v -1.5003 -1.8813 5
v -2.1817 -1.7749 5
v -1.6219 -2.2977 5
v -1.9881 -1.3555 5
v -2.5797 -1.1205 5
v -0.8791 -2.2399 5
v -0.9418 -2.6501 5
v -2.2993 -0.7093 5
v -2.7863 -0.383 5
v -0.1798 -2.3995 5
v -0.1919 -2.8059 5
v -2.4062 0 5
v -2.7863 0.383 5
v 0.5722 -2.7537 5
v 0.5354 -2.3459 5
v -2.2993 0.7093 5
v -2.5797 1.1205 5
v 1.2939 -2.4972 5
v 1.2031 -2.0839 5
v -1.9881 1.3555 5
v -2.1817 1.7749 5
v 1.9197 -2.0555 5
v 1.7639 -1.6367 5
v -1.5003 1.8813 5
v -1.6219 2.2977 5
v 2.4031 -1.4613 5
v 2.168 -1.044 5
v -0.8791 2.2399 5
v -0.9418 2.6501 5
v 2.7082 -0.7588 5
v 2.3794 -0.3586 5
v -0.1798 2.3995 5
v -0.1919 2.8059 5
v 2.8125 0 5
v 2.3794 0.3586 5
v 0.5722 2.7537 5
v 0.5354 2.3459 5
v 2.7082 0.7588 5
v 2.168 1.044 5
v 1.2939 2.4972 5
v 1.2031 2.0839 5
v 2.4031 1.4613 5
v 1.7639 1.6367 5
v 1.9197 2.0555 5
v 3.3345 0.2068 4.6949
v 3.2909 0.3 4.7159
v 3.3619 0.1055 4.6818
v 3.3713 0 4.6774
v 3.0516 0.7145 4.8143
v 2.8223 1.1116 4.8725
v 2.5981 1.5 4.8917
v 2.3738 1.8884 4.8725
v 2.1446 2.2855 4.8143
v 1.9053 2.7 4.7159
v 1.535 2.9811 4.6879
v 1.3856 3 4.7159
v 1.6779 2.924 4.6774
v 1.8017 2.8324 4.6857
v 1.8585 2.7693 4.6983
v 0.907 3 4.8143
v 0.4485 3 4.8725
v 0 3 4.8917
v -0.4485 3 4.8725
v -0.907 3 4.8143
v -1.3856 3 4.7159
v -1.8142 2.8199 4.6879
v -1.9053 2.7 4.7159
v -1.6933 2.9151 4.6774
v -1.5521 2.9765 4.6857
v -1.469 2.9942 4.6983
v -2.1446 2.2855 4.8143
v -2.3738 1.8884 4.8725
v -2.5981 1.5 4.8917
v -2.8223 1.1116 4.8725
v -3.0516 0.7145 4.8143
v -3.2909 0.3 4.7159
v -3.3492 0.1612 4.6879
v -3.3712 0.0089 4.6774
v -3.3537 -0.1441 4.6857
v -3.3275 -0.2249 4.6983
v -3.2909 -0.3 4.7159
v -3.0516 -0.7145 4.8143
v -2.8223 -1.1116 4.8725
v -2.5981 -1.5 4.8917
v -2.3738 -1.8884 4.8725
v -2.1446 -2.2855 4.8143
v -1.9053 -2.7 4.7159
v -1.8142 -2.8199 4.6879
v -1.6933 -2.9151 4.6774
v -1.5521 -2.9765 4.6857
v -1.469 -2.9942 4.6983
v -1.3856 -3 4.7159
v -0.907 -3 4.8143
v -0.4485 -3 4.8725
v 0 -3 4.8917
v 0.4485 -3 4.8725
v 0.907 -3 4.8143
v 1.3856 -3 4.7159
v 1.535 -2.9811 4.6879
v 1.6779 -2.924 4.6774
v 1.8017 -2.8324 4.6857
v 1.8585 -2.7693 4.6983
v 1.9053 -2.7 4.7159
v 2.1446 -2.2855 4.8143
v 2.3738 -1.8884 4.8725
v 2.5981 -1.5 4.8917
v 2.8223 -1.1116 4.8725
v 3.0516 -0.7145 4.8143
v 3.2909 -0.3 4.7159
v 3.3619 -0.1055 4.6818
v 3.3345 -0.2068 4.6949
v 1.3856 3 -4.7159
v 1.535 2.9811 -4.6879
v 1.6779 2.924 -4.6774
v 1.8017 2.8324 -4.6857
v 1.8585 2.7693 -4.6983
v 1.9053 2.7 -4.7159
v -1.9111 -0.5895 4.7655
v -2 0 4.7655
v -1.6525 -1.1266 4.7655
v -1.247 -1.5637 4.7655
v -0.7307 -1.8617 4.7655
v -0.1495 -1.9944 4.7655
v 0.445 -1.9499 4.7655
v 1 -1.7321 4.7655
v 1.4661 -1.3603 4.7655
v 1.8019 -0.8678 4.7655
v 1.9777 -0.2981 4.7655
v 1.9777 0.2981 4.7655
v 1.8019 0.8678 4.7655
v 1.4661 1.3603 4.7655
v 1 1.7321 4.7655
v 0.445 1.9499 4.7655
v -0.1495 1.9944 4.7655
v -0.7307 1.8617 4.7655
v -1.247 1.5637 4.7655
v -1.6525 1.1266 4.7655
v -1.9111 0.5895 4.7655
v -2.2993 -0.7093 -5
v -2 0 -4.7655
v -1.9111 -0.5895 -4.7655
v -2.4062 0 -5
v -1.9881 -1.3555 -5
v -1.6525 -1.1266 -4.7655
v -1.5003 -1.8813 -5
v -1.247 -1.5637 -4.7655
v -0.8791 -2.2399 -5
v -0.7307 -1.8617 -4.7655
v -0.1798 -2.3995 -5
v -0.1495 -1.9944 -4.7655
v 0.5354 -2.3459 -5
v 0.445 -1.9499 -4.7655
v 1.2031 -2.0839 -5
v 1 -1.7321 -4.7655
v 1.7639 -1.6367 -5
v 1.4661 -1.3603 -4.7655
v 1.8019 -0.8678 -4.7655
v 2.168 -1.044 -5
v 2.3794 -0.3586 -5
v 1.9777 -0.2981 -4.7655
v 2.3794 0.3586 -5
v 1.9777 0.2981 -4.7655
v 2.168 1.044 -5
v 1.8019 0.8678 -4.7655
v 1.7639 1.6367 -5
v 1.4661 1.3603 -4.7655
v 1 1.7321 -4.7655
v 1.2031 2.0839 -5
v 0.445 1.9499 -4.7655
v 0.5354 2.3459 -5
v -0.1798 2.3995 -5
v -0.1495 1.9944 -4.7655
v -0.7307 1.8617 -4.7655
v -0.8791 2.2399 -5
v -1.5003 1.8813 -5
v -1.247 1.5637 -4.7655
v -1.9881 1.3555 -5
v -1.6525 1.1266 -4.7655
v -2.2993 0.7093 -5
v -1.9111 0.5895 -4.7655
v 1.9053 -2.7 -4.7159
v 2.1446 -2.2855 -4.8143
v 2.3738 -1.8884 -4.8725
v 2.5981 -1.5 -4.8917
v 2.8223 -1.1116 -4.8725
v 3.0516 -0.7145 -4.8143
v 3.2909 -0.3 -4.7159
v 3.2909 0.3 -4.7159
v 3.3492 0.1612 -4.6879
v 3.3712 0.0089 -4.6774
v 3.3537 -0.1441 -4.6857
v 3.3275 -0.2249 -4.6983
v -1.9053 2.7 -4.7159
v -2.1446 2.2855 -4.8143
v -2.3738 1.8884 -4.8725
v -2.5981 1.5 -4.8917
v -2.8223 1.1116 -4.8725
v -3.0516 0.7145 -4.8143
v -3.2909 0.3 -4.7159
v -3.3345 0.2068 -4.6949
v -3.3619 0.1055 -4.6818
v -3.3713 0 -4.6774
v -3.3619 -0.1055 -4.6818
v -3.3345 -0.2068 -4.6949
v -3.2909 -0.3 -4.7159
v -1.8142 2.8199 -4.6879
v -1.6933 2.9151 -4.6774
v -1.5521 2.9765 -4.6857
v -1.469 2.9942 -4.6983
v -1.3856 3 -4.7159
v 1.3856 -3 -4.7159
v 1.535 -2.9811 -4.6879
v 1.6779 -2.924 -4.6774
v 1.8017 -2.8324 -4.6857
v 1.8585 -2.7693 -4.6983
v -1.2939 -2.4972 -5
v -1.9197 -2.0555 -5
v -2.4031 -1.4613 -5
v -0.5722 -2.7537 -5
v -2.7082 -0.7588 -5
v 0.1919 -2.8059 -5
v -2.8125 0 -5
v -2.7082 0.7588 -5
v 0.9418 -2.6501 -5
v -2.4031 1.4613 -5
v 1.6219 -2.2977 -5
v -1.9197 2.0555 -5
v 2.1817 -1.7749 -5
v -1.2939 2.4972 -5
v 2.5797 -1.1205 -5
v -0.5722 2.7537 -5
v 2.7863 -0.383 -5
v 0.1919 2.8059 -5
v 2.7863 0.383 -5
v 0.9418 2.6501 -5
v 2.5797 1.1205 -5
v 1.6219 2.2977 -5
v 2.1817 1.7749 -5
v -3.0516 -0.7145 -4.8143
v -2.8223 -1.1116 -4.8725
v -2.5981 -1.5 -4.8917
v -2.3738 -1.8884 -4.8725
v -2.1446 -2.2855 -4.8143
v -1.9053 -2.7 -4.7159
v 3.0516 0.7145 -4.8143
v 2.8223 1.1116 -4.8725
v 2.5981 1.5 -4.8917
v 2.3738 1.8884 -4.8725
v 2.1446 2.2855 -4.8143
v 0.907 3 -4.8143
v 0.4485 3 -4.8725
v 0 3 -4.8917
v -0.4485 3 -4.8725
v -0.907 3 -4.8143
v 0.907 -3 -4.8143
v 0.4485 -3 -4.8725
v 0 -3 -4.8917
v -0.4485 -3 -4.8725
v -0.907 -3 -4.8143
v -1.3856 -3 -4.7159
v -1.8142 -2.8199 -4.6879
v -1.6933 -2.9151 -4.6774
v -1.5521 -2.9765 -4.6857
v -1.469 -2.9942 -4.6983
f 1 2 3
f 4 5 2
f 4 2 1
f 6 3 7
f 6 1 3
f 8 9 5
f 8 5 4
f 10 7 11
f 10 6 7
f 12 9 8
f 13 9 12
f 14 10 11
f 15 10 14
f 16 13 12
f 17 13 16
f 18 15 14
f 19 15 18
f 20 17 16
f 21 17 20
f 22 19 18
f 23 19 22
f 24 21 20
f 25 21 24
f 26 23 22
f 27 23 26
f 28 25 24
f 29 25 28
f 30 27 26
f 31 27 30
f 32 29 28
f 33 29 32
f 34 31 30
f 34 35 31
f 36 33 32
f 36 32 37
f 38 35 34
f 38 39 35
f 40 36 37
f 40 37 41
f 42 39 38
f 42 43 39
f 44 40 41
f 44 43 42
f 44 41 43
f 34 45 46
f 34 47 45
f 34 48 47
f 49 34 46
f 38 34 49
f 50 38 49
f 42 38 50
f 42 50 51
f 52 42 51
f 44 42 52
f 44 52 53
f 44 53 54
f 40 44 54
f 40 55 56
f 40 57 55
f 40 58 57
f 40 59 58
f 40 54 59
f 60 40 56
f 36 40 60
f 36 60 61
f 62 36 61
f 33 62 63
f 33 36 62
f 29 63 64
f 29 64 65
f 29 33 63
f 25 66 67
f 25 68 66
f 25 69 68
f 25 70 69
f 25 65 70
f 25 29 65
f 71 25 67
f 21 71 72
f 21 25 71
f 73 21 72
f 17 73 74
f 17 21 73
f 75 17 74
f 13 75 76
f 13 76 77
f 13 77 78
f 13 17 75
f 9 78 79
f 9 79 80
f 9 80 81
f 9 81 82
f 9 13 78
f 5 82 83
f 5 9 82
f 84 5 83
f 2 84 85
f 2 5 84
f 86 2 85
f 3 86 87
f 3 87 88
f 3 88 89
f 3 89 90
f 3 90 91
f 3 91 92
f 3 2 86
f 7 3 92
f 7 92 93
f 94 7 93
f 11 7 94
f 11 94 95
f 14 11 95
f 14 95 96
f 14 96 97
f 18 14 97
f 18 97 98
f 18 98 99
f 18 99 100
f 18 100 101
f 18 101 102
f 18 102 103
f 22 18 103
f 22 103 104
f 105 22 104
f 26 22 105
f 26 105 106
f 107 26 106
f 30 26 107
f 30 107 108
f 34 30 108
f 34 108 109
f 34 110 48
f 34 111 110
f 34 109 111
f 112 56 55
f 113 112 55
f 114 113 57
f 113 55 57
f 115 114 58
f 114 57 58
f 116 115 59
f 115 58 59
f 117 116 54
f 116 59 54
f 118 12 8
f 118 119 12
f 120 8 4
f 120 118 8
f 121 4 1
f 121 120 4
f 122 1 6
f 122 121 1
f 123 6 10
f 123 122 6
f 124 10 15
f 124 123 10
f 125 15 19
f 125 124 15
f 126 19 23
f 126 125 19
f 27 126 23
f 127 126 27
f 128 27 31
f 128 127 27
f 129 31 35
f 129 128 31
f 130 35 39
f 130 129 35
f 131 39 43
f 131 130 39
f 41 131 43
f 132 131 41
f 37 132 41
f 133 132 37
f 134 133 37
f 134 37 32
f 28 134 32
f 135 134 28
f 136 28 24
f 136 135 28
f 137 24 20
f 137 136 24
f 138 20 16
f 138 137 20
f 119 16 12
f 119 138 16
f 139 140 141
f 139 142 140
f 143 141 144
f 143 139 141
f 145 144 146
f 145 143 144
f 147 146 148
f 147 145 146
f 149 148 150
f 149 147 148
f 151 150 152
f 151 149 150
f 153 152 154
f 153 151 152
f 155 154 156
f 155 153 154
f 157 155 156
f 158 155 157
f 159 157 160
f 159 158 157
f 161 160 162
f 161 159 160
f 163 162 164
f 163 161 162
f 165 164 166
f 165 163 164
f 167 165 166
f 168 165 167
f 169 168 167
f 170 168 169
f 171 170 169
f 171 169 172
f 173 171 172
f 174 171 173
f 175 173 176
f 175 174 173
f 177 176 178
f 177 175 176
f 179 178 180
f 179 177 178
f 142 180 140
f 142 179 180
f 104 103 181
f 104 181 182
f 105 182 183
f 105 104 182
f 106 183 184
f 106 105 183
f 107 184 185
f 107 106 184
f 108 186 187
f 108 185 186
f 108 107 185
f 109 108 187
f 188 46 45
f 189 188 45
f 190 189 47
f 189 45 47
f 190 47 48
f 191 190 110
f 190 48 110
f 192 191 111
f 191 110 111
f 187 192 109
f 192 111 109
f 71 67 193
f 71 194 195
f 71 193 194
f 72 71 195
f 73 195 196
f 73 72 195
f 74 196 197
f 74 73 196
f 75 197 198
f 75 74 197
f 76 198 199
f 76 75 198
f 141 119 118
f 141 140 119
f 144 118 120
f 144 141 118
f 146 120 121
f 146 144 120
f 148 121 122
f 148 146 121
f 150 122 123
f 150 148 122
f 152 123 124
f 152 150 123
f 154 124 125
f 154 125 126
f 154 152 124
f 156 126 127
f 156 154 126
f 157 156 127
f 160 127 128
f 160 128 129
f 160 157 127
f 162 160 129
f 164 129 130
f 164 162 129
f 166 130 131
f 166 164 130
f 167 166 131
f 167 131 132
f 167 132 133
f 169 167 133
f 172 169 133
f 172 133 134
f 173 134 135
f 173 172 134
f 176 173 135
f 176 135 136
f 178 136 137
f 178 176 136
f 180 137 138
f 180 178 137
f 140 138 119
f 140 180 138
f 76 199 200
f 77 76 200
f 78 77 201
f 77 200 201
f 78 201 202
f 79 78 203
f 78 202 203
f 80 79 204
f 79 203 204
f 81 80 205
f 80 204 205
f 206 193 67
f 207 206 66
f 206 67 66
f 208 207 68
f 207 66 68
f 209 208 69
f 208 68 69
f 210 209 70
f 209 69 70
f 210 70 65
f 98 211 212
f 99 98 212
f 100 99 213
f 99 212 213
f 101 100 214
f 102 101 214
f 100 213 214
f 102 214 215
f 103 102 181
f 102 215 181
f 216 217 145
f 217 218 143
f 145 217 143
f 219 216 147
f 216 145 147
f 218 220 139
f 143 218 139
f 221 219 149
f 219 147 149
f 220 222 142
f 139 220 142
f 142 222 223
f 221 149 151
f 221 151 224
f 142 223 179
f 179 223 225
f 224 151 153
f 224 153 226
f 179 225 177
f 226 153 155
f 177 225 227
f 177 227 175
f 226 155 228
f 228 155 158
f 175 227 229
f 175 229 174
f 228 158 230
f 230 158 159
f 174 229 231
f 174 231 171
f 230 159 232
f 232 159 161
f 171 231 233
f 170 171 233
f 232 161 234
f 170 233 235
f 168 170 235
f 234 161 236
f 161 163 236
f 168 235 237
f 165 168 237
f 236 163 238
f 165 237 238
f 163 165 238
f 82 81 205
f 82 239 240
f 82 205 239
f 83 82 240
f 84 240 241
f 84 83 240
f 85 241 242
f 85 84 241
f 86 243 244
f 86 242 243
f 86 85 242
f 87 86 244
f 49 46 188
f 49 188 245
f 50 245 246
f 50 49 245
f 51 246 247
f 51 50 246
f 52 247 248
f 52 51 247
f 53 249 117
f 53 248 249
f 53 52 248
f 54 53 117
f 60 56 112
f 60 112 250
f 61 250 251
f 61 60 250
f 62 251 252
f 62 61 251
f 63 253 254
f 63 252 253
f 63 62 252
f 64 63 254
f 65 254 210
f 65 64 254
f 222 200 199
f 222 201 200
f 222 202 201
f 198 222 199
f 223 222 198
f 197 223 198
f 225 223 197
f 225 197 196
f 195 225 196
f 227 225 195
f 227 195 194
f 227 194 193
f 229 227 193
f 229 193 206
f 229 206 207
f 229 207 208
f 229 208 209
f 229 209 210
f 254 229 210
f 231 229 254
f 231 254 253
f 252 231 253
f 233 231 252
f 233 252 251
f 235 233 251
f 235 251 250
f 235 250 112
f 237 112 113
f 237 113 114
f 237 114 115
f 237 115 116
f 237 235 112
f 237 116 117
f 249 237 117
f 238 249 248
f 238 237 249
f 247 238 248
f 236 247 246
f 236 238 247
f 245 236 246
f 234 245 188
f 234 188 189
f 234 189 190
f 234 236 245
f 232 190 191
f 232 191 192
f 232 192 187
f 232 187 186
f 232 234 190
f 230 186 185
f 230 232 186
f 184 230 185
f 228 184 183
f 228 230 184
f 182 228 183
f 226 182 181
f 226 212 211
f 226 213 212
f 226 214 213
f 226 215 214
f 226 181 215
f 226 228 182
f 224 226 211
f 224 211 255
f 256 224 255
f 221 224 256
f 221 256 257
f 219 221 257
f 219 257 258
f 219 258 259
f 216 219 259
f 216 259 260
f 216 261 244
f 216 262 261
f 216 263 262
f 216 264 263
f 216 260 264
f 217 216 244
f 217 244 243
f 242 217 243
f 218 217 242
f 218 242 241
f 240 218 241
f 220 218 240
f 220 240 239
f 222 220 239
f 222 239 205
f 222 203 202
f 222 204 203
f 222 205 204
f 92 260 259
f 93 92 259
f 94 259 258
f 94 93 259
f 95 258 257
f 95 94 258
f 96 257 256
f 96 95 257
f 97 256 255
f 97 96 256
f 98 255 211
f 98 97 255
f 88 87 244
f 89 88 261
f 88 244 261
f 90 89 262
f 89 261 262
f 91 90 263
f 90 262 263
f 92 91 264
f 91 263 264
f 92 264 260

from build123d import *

# Parameters (mm, degrees)
SKETCH4_R           = 2.5
BOSS_EXTRUDE1_DEPTH = 5
SKETCH5_OUTSIDE_W   = 53.21
SKETCH5_OUTSIDE_H   = 52.282
SKETCH5_OUTSIDE_R   = 2.8125
CUT_EXTRUDE1_DEPTH  = 12
CUT_EXTRUDE1_DRAFT  = -60
SKETCH6_OUTSIDE_W   = 53.21
SKETCH6_OUTSIDE_H   = 52.282
SKETCH6_OUTSIDE_R   = 2.8125
CUT_EXTRUDE2_DEPTH  = 12
CUT_EXTRUDE2_DRAFT  = -60
FILLET1_R           = 0.6


with BuildPart() as part:
    # Sketch3 → Revolve1 (revolve)
    with BuildSketch(Plane(origin=(0, 0, 0), x_dir=(0, 0, -1), z_dir=(1, 0, 0)), mode=Mode.PRIVATE) as revolve1_sk:
        Polygon((5, 2.40625), (5, 3), (0, 3), (-5, 3), (-5, 2.40625), (-4.765451453, 2), (4.765451453, 2), align=None)
        Polygon((5, 2.40625), (5, 3), (0, 3), (-5, 3), (-5, 2.40625), (-4.765451453, 2), (4.765451453, 2), align=None)
    revolve(revolve1_sk.sketch.rotate(Axis((0, 0, -5), (0, 0, 1)), 90), axis=Axis((0, 0, -5), (0, 0, 1)))

    # Sketch4 → Boss-Extrude1 (add, symmetric)
    with BuildSketch(Plane.XY):
        Polygon((-1.732050808, 3), (-3.464101615, 0), (-1.732050808, -3), (1.732050808, -3), (3.464101615, 0), (1.732050808, 3), align=None)
        Circle(SKETCH4_R, mode=Mode.SUBTRACT)
    extrude(amount=BOSS_EXTRUDE1_DEPTH, both=True)


with BuildPart() as cut_extrude1_tool:
    # Sketch5 outside → Cut-Extrude1 (with draft: the straight prism first)
    with BuildSketch(Plane.XY.offset(5)):
        Rectangle(SKETCH5_OUTSIDE_W, SKETCH5_OUTSIDE_H)
        Circle(SKETCH5_OUTSIDE_R, mode=Mode.SUBTRACT)
    extrude(amount=-CUT_EXTRUDE1_DEPTH)
    # Cut-Extrude1: the draft: its side faces are tilted about the plane it starts from
    cut_extrude1_sides = [cut_extrude1_tool.faces().sort_by_distance(p)[0] for p in [
        (0, -26.141, -1),
        (26.605, 0, -1),
        (0, 26.141, -1),
        (-26.605, 0, -1),
        (-2.8125, 0, -1),
    ]]
    draft(cut_extrude1_sides, Plane.XY.offset(5), CUT_EXTRUDE1_DRAFT)


with BuildPart() as part_1:
    add(part.part)

    # Cut-Extrude1: cut by cut_extrude1_tool
    add(cut_extrude1_tool.part, mode=Mode.SUBTRACT)


with BuildPart() as cut_extrude2_tool:
    # Sketch6 outside → Cut-Extrude2 (with draft: the straight prism first)
    with BuildSketch(Plane(origin=(0, 0, -5), x_dir=(-1, 0, 0), z_dir=(0, 0, -1))):
        Rectangle(SKETCH6_OUTSIDE_W, SKETCH6_OUTSIDE_H)
        Circle(SKETCH6_OUTSIDE_R, mode=Mode.SUBTRACT)
    extrude(amount=-CUT_EXTRUDE2_DEPTH)
    # Cut-Extrude2: the draft: its side faces are tilted about the plane it starts from
    cut_extrude2_sides = [cut_extrude2_tool.faces().sort_by_distance(p)[0] for p in [
        (0, -26.141, 1),
        (-26.605, 0, 1),
        (0, 26.141, 1),
        (26.605, 0, 1),
        (2.8125, 0, 1),
    ]]
    draft(cut_extrude2_sides, Plane(origin=(0, 0, -5), x_dir=(-1, 0, 0), z_dir=(0, 0, -1)), CUT_EXTRUDE2_DRAFT)


with BuildPart() as part_2:
    add(part_1.part)

    # Cut-Extrude2: cut by cut_extrude2_tool
    add(cut_extrude2_tool.part, mode=Mode.SUBTRACT)

    # Fillet1
    # the kernel refuses this fillet: 0.6 mm, written as the material it takes off along each edge
    with BuildSketch(Plane(origin=(1.732050808, 3, 5.489823036), x_dir=(0.4999999999999995, -0.866025403784439, 0), z_dir=(0, 0, -1)), Plane(origin=(-3.464101615, 0, -5.489823036), x_dir=(0.5000000000000011, -0.8660254037844379, 0), z_dir=(0, 0, 1)), Plane(origin=(3.464101615, 0, 5.489823036), x_dir=(-0.4999999999999996, -0.8660254037844388, 0), z_dir=(0, 0, -1)), Plane(origin=(-1.732050808, 3, 5.489823036), x_dir=(1, 0, 0), z_dir=(0, 0, -1))) as fillet1_piece_1:
        with BuildLine():
            CenterArc((FILLET1_R * 0.57735026919, FILLET1_R), FILLET1_R, 210, 60)
            Line((-FILLET1_R * 0.288675134595, FILLET1_R * 0.5), (0, 0))
            Line((0, 0), (FILLET1_R * 0.57735026919, 0))
        make_face()
    extrude(amount=10.979646072, mode=Mode.SUBTRACT)
    with BuildSketch(Plane(origin=(-1.732050808, -3, -5.489823036), x_dir=(-0.5000000000000002, 0.8660254037844385, 0), z_dir=(0, 0, 1)), Plane(origin=(1.732050808, -3, -5.489823036), x_dir=(-1, 0, 0), z_dir=(0, 0, 1))) as fillet1_piece_2:
        with BuildLine():
            CenterArc((FILLET1_R * 0.57735026919, -FILLET1_R), FILLET1_R, 90, 60)
            Line((-FILLET1_R * 0.288675134595, -FILLET1_R * 0.5), (0, 0))
            Line((0, 0), (FILLET1_R * 0.57735026919, 0))
        make_face()
    extrude(amount=10.979646072, mode=Mode.SUBTRACT)


solid = part_2.part
